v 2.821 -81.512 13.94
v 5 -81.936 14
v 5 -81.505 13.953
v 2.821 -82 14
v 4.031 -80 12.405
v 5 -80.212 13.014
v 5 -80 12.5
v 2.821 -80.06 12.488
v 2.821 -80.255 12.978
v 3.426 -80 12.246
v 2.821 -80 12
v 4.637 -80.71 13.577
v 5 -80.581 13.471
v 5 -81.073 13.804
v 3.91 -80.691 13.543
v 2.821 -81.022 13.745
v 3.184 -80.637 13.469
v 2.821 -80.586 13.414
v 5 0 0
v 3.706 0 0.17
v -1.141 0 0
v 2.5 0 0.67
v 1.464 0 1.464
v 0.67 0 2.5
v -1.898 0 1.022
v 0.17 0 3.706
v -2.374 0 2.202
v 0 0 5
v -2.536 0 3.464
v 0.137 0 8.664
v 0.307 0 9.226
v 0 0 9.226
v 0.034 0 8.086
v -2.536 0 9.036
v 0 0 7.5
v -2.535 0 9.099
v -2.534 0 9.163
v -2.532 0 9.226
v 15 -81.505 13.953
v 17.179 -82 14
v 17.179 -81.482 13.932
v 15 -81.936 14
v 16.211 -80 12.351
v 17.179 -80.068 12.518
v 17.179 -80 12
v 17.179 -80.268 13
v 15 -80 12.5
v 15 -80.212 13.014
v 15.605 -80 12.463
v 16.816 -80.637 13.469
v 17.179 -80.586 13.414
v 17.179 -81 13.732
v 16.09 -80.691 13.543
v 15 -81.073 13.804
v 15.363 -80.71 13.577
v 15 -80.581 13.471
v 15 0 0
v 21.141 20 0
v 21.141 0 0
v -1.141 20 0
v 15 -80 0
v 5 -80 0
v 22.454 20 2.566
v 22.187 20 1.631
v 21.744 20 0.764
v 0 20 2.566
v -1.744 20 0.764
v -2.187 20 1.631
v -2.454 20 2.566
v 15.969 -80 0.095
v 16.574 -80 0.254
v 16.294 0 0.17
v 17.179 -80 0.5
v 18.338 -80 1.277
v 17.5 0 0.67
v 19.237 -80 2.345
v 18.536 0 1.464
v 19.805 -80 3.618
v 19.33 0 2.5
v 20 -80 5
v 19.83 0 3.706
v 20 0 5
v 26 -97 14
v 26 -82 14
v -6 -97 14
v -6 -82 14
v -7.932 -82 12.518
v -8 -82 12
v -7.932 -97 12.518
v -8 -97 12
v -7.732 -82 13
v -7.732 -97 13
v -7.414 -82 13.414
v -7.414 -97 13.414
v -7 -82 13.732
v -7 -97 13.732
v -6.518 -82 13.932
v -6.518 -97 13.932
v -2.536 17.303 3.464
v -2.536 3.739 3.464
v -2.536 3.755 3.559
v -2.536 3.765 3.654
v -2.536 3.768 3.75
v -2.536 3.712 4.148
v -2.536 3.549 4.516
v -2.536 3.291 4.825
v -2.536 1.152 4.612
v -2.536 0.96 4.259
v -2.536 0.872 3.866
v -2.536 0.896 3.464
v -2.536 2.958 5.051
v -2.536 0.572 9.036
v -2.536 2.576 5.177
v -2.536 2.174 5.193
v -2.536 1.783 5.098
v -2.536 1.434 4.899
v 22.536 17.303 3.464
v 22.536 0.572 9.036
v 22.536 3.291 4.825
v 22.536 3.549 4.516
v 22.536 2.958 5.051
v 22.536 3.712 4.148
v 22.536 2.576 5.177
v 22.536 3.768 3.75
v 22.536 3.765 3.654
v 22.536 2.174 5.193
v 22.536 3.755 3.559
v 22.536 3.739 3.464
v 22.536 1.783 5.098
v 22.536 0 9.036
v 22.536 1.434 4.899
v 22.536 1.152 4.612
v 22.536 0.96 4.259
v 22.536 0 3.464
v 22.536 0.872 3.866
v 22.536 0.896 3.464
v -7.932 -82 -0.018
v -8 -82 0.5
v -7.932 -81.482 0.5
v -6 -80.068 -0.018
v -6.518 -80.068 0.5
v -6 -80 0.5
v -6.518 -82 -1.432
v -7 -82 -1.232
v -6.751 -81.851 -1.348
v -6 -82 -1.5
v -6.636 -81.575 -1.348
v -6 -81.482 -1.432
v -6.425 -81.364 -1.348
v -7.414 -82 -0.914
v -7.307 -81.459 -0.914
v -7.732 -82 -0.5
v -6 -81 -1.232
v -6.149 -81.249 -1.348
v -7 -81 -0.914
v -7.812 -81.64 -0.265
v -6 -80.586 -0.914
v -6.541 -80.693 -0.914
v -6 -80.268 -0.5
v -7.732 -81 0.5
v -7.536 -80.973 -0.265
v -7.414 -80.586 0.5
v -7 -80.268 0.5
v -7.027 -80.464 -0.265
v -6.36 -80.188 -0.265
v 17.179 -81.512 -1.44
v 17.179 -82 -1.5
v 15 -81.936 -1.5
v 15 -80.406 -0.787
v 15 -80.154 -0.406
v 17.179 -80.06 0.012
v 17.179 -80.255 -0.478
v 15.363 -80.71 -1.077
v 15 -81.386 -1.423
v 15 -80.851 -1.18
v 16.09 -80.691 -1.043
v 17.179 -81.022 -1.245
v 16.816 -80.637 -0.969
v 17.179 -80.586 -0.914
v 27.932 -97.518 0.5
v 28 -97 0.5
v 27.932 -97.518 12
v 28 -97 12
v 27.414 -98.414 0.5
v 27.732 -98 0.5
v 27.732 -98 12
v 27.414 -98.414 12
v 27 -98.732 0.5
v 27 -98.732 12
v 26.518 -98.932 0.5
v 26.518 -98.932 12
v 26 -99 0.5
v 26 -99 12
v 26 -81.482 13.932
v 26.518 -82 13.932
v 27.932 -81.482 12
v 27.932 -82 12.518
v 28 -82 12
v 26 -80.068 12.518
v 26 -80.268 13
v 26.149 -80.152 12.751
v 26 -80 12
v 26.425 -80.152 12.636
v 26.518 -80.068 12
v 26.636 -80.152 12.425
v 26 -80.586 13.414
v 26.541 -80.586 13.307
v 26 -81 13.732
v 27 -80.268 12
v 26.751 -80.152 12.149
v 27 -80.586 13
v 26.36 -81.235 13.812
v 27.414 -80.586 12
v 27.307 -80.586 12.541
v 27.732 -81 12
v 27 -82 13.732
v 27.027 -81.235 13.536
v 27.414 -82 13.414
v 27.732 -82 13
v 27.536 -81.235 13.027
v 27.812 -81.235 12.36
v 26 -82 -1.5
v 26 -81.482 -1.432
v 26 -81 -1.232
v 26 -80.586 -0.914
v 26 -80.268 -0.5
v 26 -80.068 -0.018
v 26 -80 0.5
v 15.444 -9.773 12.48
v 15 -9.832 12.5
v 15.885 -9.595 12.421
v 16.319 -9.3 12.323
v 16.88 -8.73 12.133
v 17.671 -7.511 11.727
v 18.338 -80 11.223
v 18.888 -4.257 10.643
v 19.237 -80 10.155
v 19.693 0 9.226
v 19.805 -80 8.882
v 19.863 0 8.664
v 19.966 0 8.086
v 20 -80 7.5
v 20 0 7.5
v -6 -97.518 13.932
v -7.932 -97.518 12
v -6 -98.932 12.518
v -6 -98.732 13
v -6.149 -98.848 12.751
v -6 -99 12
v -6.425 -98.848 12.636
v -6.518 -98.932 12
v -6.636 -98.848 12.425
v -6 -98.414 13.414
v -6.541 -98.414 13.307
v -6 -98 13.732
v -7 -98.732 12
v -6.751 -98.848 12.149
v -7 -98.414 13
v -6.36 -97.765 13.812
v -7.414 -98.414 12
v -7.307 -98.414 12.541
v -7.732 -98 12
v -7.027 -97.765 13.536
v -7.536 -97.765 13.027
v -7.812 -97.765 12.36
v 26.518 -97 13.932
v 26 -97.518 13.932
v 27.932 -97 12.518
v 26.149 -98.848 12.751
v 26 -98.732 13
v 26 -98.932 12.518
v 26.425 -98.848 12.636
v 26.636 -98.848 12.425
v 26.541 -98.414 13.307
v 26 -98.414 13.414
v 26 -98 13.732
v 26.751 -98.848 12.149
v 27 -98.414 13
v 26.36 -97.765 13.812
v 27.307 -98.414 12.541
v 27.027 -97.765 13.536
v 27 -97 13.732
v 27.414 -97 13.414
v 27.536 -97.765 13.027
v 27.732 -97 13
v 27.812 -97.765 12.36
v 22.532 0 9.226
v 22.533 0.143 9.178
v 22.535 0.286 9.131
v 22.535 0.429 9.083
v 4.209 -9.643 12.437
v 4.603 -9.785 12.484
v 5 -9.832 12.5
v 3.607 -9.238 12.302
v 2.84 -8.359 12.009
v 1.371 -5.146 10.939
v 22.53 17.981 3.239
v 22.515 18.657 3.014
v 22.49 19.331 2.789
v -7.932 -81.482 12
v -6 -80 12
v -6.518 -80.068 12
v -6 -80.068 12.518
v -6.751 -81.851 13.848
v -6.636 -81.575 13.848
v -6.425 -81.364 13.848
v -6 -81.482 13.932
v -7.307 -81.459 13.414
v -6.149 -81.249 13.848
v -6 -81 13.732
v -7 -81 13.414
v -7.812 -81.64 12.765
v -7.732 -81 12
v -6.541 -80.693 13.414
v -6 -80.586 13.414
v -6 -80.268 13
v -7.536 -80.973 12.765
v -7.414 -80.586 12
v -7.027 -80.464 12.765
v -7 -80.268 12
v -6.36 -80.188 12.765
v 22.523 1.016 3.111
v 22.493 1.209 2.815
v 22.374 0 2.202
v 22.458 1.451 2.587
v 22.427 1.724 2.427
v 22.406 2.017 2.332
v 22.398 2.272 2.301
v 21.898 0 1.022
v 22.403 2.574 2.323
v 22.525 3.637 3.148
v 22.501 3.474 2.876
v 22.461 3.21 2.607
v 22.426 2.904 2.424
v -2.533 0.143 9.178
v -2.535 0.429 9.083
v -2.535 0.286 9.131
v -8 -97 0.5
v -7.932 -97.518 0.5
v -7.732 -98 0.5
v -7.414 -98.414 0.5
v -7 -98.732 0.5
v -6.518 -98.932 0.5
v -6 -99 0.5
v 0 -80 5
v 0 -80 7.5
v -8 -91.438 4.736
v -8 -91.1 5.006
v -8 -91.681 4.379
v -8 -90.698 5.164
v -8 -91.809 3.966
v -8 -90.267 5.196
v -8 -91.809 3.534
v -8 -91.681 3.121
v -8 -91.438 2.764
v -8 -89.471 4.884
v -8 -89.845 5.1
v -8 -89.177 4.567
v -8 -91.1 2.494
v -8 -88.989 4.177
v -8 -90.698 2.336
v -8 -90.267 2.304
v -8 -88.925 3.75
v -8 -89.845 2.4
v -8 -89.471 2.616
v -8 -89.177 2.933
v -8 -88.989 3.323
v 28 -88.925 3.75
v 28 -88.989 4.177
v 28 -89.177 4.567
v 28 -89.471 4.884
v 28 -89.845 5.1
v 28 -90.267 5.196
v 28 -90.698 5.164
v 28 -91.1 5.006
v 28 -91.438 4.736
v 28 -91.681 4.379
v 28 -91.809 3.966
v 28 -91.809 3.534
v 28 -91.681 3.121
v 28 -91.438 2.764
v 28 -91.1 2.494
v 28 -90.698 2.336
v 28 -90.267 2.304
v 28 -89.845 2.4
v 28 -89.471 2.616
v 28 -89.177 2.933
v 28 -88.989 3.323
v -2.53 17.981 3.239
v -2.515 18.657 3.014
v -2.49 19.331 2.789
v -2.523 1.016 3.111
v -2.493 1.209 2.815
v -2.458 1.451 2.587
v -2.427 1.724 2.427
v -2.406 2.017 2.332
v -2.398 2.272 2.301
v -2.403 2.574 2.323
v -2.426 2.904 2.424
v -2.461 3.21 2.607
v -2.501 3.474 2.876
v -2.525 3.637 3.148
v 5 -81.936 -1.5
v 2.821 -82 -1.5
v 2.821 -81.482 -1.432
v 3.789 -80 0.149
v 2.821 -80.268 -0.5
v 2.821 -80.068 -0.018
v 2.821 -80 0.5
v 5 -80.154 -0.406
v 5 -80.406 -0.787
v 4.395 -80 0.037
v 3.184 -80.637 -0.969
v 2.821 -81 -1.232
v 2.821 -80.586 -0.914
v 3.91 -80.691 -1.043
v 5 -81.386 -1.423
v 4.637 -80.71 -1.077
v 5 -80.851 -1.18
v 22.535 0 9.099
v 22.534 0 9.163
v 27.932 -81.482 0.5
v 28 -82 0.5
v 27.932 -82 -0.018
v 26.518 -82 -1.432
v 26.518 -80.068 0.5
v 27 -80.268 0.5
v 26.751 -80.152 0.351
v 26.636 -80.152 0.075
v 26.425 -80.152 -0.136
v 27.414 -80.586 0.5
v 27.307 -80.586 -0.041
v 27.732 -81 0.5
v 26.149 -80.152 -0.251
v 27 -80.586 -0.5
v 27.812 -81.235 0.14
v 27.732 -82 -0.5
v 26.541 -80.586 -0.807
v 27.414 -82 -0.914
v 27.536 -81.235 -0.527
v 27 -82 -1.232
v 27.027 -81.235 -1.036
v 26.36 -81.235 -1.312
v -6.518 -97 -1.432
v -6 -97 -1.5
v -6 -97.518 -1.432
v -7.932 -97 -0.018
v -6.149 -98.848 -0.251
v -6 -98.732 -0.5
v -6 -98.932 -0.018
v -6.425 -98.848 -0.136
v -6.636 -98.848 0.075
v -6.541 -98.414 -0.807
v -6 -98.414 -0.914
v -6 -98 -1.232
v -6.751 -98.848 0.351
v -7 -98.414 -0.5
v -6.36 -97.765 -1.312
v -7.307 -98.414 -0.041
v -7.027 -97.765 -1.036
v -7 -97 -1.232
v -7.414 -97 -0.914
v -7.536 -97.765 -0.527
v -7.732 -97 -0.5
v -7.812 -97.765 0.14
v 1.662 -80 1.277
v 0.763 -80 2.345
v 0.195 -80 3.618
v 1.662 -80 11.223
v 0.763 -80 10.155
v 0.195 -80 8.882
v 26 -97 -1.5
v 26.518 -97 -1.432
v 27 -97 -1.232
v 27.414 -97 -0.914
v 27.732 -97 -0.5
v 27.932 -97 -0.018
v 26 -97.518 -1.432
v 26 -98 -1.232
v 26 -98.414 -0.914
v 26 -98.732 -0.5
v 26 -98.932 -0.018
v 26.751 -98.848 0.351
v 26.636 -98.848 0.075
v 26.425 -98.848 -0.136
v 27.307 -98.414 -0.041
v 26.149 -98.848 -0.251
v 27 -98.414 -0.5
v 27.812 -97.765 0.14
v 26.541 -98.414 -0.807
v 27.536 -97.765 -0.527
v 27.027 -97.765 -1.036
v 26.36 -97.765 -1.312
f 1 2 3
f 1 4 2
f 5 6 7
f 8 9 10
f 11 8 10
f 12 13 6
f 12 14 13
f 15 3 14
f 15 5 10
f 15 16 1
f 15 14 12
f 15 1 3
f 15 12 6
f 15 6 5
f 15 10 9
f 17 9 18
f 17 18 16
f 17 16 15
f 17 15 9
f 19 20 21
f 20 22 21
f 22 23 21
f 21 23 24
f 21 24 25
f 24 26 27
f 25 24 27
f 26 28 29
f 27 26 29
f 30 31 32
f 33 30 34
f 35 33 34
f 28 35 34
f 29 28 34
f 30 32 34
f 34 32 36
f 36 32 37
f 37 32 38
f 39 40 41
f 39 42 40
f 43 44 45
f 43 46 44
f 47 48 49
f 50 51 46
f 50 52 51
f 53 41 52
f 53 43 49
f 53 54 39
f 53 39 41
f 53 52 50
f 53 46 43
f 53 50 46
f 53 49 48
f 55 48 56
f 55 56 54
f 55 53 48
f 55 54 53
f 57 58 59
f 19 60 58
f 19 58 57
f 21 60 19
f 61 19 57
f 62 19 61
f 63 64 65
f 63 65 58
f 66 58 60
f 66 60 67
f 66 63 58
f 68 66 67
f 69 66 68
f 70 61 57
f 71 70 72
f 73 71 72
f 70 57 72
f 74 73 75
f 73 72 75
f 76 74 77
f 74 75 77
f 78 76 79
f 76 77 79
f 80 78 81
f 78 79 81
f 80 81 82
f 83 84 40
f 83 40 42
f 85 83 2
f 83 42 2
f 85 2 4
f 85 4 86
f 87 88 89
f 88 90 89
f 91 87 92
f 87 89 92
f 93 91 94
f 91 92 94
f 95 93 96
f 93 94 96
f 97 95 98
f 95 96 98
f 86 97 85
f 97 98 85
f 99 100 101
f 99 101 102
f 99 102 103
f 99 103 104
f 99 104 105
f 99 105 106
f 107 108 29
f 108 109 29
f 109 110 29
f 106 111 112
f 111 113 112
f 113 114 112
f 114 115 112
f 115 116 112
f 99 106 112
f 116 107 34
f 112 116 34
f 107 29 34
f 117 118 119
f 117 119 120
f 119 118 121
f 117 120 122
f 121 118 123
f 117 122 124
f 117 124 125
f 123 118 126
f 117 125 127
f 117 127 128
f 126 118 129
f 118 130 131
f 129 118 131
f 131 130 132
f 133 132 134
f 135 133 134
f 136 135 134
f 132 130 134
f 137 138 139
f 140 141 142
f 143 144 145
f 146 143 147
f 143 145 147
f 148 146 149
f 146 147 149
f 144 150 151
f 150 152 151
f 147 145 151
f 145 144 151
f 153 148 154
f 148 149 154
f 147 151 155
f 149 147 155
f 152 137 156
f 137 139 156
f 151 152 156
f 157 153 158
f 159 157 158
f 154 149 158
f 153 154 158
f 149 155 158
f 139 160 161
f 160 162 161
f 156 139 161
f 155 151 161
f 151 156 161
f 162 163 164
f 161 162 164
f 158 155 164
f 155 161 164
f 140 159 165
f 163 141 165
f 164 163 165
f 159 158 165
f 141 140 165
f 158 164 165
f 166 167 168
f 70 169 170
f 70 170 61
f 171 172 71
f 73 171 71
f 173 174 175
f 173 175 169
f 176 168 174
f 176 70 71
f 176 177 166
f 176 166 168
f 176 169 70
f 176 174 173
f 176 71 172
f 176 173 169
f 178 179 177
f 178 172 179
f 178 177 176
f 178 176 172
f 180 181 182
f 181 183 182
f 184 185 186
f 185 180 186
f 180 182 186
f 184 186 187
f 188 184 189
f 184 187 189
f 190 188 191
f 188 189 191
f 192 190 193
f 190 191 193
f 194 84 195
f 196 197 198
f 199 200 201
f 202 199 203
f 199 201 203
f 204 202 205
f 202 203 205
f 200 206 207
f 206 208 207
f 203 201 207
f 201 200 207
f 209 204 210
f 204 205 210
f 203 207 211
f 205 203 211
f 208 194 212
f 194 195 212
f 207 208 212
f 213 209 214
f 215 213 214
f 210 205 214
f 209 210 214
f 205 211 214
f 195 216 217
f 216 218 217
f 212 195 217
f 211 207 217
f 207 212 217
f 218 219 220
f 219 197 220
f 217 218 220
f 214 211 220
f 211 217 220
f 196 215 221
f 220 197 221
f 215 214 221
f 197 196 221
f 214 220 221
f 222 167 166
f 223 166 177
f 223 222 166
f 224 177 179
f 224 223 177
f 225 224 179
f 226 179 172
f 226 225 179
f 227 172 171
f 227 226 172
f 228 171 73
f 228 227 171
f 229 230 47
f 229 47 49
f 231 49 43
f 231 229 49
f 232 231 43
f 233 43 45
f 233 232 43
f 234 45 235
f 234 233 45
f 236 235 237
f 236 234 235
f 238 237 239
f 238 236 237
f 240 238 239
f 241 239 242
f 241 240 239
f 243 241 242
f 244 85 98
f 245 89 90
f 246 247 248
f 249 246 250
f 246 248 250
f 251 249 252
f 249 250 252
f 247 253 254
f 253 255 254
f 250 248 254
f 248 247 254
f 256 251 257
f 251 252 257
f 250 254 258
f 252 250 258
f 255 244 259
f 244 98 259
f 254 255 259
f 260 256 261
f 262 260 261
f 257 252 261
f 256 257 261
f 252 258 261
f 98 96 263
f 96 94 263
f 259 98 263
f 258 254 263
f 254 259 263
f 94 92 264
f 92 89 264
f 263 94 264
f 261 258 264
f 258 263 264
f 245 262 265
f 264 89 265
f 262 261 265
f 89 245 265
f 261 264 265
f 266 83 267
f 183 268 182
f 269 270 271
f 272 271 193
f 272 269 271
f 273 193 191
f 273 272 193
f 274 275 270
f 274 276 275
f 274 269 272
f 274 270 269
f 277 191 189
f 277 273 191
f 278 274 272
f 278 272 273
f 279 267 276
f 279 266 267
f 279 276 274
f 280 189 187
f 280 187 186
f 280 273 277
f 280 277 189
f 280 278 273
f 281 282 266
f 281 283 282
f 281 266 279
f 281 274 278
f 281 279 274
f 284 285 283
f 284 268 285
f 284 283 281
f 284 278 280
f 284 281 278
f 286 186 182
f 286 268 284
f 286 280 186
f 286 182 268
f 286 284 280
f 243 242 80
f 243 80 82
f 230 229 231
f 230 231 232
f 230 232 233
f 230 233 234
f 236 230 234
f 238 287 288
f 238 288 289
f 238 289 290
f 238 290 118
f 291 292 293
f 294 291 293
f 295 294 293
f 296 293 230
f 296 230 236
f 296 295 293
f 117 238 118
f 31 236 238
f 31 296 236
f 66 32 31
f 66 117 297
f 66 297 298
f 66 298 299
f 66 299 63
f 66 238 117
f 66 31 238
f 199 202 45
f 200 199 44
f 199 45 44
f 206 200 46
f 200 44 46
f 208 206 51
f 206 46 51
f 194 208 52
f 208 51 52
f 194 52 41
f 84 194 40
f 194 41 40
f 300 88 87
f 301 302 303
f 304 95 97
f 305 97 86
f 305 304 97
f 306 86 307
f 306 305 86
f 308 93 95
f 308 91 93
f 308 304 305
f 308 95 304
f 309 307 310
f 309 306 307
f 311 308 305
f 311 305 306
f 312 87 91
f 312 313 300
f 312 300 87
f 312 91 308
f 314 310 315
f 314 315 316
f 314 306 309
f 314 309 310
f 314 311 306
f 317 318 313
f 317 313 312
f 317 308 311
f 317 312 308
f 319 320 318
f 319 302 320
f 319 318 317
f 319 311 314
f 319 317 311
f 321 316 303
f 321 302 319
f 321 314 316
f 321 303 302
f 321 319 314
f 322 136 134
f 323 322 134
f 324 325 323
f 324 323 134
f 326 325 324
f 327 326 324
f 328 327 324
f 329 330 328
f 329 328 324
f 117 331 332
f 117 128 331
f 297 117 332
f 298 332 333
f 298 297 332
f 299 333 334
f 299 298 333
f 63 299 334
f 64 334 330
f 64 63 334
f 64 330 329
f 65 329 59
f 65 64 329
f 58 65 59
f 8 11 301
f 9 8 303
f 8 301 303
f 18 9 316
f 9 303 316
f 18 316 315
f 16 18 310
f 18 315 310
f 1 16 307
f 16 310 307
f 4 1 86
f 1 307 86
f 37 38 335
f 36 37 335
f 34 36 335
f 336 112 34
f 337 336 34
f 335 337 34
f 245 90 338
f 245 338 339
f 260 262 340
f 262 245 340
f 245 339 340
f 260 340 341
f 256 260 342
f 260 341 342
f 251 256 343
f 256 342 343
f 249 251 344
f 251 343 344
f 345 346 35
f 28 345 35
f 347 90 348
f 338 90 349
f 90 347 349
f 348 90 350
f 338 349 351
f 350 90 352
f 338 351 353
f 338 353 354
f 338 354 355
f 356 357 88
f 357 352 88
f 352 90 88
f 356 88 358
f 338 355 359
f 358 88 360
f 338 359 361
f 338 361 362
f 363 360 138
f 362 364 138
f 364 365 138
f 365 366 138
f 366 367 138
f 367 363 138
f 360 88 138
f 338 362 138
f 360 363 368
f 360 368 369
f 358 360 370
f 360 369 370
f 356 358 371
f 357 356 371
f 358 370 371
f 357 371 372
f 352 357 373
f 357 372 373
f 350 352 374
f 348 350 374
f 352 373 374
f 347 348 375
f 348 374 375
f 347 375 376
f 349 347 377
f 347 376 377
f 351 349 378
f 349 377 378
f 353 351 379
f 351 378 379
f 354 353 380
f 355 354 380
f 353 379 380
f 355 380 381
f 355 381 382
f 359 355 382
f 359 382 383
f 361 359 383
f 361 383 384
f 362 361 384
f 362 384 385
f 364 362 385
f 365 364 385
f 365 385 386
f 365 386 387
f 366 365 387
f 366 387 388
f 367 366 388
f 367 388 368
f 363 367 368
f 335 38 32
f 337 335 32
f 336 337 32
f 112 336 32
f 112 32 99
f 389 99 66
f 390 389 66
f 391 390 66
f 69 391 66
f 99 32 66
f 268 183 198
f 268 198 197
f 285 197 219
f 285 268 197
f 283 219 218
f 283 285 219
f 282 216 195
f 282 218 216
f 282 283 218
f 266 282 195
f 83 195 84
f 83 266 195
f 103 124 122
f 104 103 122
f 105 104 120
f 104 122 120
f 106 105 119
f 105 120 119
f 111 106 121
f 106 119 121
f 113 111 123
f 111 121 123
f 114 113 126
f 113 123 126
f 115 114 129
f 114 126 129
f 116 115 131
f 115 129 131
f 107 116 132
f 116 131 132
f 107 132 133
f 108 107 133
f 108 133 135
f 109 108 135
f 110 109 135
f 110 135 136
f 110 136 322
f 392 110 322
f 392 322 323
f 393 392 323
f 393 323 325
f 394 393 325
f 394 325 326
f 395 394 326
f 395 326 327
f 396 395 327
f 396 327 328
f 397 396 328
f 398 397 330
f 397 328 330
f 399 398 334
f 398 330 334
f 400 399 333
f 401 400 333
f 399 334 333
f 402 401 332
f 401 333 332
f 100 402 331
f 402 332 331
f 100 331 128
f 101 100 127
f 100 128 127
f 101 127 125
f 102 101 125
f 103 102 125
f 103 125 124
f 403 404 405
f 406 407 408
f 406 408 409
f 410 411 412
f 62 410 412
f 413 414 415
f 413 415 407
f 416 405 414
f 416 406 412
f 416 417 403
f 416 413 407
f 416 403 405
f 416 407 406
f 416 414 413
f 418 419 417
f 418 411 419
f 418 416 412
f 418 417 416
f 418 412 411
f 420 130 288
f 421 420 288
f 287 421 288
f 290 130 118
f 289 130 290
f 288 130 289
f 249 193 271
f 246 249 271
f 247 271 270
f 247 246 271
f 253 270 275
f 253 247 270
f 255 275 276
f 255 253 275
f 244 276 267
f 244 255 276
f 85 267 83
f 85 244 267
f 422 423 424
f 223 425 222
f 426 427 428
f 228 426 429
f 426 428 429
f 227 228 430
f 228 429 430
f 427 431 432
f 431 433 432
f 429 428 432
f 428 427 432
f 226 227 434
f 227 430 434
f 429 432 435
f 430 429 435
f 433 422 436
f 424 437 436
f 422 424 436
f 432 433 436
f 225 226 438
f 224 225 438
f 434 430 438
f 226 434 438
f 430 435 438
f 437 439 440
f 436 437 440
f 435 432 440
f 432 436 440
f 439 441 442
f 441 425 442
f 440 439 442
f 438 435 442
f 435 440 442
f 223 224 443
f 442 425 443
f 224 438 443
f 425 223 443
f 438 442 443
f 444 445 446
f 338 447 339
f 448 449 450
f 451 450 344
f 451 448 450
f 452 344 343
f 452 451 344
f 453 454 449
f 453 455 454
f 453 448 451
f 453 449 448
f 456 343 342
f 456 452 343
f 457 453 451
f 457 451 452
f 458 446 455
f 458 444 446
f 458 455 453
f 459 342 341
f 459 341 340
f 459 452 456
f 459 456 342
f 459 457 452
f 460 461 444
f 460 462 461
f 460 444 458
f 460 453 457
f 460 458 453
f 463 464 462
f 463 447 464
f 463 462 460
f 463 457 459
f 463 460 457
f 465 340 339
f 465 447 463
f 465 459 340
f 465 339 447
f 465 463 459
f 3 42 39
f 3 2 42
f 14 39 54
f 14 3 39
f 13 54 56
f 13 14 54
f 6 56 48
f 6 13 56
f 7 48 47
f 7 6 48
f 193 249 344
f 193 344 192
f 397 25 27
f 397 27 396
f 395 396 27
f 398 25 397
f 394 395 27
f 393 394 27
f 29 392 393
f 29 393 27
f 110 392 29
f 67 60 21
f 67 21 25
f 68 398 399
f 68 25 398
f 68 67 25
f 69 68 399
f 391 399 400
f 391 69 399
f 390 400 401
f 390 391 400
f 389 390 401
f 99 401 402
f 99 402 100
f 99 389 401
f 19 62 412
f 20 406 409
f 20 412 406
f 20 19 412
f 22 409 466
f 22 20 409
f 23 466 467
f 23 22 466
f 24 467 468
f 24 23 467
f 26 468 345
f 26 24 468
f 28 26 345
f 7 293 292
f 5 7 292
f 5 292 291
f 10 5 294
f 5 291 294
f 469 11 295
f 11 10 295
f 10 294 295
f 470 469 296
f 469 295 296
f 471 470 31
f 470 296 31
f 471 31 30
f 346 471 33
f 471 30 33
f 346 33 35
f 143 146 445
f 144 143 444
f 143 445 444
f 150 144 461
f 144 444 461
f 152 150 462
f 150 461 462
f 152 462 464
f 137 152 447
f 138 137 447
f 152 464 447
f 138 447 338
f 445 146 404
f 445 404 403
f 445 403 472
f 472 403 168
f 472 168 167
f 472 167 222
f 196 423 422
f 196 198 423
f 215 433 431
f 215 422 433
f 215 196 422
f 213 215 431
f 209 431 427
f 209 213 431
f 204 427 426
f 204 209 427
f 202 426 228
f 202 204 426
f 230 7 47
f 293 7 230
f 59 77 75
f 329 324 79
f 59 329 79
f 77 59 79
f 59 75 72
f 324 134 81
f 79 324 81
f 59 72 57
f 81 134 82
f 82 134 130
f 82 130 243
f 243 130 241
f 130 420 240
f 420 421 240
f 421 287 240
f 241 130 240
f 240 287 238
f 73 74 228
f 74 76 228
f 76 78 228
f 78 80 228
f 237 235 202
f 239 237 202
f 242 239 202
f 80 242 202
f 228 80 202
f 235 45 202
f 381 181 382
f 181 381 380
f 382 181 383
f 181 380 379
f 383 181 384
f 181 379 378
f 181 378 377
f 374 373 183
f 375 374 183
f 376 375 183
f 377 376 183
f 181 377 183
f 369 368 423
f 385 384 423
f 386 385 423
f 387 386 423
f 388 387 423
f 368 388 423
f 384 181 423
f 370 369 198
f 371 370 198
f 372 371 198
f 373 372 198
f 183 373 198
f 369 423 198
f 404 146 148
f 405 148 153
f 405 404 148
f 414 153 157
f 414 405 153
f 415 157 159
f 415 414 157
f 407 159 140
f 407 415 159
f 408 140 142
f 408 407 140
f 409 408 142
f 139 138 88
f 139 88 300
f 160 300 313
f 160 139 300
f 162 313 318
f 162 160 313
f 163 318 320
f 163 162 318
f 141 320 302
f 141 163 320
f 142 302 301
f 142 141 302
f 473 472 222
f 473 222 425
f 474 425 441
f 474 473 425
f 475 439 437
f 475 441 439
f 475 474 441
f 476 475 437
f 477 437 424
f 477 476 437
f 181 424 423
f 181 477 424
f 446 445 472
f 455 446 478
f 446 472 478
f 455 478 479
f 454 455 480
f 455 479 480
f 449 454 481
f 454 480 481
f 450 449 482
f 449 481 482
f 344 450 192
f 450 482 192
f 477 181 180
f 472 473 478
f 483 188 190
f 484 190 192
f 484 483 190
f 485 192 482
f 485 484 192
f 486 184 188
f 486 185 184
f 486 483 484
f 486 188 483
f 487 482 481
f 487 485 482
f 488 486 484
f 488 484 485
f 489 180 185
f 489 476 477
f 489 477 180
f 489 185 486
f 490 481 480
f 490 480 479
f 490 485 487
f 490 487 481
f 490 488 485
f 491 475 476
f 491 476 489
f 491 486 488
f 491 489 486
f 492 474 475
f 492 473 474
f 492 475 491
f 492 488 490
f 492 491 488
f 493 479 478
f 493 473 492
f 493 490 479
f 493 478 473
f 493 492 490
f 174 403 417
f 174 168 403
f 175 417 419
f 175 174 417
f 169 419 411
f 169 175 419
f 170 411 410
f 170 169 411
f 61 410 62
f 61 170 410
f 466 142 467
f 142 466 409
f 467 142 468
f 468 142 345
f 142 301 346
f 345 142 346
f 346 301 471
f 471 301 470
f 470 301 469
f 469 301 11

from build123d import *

# Parameters (mm, degrees)
F0_W      = 80
F0_H      = 12.5
F1_DEPTH  = 20
F2_R      = 5
F4_DEPTH  = 20
F5_R      = 5
F7_DEPTH  = 25
F9_DEPTH  = 25
F10_W     = 20
F10_H     = 0.8859829484
F11_DEPTH = 25
F13_DEPTH = 19
F14_R     = 2
F15_R     = 1.45
F16_DEPTH = 100


with BuildPart() as f1:
    # F0 (on Right) → F1 (new body)
    with BuildSketch(Plane.YZ):
        with Locations((-40, 6.25)):
            Rectangle(F0_W, F0_H)
    extrude(amount=F1_DEPTH)

    # F2
    f2_edges = [f1.edges().sort_by_distance(p)[0] for p in [
        (20, -40, 12.5),
        (20, -40, 0),
        (0, -40, 12.5),
        (0, -40, 0),
    ]]
    fillet(f2_edges, radius=F2_R)

    # F3 (on face) → F4 (join)
    with BuildSketch(Plane(origin=(0, 0, 0), x_dir=(-1, 0, 0), z_dir=(0, 1, 0))):
        Polygon((-22.5355339059, 14.0355339059), (-22.5355339059, 11.0355339059), (-22.5355339059, -1.5355339059), (-18.5355339059, -1.5355339059), (2.5355339059, -1.5355339059), (2.5355339059, 11.0355339059), (2.5355339059, 14.0355339059), align=None)
    extrude(amount=F4_DEPTH)

    # F5
    f5_edges = [f1.edges().sort_by_distance(p)[0] for p in [
        (22.535534, 10, 14.035534),
        (22.535534, 10, -1.535534),
        (-2.535534, 10, -1.535534),
        (-2.535534, 10, 14.035534),
    ]]
    fillet(f5_edges, radius=F5_R)

    # F6 (on Right) → F7 (cut)
    with BuildSketch(Plane.YZ):
        Polygon((20, 0), (0, 0), (0, -2.4886932224), (20, -2.4886932224), (23.4880913049, -2.4886932224), (23.4486758709, 14.381791465), (20, 14.381791465), (-15.4835612513, 14.381791465), (-9.843991138, 12.5039182603), (20, 2.5664176792), align=None)
    extrude(amount=F7_DEPTH, mode=Mode.SUBTRACT)

    # F8 (on face) → F9 (cut)
    with BuildSketch(Plane.YZ):
        Polygon((0, 9.2260501226), (20, 2.5664176792), (20, 13.3859829484), (0, 13.3859829484), align=None)
    extrude(amount=-F9_DEPTH, mode=Mode.SUBTRACT)

    # F10 (on face) → F11 (cut)
    with BuildSketch(Plane.YZ):
        with Locations((10, -0.4429914742)):
            Rectangle(F10_W, F10_H)
    extrude(amount=-F11_DEPTH, mode=Mode.SUBTRACT)

    # F12 (on face) → F13 (join)
    with BuildSketch(Plane.XZ.offset(80)):
        Polygon((-8, 12.5), (-8, 0), (-8, -1.5), (28, -1.5), (28, 0), (28, 14), (-8, 14), align=None)
    extrude(amount=F13_DEPTH)

    # F14
    f14_edges = [f1.edges().sort_by_distance(p)[0] for p in [
        (-8, -80, 6.25),
        (28, -89.5, 14),
        (-8, -89.5, 14),
        (10, -80, 14),
        (10, -99, 14),
        (28, -89.5, -1.5),
        (28, -99, 6.25),
        (28, -80, 6.25),
        (-8, -89.5, -1.5),
        (10, -80, -1.5),
        (10, -99, -1.5),
        (-8, -99, 6.25),
    ]]
    fillet(f14_edges, radius=F14_R)

    # F15 (on face) → F16 (cut)
    with BuildSketch(Plane.YZ.offset(28)):
        with Locations((-90.3749987483, 3.750000149)):
            Circle(F15_R)
        with Locations((2.3177627008, 3.750000149)):
            Circle(F15_R)
    extrude(amount=-F16_DEPTH, mode=Mode.SUBTRACT)


solid = f1.part
